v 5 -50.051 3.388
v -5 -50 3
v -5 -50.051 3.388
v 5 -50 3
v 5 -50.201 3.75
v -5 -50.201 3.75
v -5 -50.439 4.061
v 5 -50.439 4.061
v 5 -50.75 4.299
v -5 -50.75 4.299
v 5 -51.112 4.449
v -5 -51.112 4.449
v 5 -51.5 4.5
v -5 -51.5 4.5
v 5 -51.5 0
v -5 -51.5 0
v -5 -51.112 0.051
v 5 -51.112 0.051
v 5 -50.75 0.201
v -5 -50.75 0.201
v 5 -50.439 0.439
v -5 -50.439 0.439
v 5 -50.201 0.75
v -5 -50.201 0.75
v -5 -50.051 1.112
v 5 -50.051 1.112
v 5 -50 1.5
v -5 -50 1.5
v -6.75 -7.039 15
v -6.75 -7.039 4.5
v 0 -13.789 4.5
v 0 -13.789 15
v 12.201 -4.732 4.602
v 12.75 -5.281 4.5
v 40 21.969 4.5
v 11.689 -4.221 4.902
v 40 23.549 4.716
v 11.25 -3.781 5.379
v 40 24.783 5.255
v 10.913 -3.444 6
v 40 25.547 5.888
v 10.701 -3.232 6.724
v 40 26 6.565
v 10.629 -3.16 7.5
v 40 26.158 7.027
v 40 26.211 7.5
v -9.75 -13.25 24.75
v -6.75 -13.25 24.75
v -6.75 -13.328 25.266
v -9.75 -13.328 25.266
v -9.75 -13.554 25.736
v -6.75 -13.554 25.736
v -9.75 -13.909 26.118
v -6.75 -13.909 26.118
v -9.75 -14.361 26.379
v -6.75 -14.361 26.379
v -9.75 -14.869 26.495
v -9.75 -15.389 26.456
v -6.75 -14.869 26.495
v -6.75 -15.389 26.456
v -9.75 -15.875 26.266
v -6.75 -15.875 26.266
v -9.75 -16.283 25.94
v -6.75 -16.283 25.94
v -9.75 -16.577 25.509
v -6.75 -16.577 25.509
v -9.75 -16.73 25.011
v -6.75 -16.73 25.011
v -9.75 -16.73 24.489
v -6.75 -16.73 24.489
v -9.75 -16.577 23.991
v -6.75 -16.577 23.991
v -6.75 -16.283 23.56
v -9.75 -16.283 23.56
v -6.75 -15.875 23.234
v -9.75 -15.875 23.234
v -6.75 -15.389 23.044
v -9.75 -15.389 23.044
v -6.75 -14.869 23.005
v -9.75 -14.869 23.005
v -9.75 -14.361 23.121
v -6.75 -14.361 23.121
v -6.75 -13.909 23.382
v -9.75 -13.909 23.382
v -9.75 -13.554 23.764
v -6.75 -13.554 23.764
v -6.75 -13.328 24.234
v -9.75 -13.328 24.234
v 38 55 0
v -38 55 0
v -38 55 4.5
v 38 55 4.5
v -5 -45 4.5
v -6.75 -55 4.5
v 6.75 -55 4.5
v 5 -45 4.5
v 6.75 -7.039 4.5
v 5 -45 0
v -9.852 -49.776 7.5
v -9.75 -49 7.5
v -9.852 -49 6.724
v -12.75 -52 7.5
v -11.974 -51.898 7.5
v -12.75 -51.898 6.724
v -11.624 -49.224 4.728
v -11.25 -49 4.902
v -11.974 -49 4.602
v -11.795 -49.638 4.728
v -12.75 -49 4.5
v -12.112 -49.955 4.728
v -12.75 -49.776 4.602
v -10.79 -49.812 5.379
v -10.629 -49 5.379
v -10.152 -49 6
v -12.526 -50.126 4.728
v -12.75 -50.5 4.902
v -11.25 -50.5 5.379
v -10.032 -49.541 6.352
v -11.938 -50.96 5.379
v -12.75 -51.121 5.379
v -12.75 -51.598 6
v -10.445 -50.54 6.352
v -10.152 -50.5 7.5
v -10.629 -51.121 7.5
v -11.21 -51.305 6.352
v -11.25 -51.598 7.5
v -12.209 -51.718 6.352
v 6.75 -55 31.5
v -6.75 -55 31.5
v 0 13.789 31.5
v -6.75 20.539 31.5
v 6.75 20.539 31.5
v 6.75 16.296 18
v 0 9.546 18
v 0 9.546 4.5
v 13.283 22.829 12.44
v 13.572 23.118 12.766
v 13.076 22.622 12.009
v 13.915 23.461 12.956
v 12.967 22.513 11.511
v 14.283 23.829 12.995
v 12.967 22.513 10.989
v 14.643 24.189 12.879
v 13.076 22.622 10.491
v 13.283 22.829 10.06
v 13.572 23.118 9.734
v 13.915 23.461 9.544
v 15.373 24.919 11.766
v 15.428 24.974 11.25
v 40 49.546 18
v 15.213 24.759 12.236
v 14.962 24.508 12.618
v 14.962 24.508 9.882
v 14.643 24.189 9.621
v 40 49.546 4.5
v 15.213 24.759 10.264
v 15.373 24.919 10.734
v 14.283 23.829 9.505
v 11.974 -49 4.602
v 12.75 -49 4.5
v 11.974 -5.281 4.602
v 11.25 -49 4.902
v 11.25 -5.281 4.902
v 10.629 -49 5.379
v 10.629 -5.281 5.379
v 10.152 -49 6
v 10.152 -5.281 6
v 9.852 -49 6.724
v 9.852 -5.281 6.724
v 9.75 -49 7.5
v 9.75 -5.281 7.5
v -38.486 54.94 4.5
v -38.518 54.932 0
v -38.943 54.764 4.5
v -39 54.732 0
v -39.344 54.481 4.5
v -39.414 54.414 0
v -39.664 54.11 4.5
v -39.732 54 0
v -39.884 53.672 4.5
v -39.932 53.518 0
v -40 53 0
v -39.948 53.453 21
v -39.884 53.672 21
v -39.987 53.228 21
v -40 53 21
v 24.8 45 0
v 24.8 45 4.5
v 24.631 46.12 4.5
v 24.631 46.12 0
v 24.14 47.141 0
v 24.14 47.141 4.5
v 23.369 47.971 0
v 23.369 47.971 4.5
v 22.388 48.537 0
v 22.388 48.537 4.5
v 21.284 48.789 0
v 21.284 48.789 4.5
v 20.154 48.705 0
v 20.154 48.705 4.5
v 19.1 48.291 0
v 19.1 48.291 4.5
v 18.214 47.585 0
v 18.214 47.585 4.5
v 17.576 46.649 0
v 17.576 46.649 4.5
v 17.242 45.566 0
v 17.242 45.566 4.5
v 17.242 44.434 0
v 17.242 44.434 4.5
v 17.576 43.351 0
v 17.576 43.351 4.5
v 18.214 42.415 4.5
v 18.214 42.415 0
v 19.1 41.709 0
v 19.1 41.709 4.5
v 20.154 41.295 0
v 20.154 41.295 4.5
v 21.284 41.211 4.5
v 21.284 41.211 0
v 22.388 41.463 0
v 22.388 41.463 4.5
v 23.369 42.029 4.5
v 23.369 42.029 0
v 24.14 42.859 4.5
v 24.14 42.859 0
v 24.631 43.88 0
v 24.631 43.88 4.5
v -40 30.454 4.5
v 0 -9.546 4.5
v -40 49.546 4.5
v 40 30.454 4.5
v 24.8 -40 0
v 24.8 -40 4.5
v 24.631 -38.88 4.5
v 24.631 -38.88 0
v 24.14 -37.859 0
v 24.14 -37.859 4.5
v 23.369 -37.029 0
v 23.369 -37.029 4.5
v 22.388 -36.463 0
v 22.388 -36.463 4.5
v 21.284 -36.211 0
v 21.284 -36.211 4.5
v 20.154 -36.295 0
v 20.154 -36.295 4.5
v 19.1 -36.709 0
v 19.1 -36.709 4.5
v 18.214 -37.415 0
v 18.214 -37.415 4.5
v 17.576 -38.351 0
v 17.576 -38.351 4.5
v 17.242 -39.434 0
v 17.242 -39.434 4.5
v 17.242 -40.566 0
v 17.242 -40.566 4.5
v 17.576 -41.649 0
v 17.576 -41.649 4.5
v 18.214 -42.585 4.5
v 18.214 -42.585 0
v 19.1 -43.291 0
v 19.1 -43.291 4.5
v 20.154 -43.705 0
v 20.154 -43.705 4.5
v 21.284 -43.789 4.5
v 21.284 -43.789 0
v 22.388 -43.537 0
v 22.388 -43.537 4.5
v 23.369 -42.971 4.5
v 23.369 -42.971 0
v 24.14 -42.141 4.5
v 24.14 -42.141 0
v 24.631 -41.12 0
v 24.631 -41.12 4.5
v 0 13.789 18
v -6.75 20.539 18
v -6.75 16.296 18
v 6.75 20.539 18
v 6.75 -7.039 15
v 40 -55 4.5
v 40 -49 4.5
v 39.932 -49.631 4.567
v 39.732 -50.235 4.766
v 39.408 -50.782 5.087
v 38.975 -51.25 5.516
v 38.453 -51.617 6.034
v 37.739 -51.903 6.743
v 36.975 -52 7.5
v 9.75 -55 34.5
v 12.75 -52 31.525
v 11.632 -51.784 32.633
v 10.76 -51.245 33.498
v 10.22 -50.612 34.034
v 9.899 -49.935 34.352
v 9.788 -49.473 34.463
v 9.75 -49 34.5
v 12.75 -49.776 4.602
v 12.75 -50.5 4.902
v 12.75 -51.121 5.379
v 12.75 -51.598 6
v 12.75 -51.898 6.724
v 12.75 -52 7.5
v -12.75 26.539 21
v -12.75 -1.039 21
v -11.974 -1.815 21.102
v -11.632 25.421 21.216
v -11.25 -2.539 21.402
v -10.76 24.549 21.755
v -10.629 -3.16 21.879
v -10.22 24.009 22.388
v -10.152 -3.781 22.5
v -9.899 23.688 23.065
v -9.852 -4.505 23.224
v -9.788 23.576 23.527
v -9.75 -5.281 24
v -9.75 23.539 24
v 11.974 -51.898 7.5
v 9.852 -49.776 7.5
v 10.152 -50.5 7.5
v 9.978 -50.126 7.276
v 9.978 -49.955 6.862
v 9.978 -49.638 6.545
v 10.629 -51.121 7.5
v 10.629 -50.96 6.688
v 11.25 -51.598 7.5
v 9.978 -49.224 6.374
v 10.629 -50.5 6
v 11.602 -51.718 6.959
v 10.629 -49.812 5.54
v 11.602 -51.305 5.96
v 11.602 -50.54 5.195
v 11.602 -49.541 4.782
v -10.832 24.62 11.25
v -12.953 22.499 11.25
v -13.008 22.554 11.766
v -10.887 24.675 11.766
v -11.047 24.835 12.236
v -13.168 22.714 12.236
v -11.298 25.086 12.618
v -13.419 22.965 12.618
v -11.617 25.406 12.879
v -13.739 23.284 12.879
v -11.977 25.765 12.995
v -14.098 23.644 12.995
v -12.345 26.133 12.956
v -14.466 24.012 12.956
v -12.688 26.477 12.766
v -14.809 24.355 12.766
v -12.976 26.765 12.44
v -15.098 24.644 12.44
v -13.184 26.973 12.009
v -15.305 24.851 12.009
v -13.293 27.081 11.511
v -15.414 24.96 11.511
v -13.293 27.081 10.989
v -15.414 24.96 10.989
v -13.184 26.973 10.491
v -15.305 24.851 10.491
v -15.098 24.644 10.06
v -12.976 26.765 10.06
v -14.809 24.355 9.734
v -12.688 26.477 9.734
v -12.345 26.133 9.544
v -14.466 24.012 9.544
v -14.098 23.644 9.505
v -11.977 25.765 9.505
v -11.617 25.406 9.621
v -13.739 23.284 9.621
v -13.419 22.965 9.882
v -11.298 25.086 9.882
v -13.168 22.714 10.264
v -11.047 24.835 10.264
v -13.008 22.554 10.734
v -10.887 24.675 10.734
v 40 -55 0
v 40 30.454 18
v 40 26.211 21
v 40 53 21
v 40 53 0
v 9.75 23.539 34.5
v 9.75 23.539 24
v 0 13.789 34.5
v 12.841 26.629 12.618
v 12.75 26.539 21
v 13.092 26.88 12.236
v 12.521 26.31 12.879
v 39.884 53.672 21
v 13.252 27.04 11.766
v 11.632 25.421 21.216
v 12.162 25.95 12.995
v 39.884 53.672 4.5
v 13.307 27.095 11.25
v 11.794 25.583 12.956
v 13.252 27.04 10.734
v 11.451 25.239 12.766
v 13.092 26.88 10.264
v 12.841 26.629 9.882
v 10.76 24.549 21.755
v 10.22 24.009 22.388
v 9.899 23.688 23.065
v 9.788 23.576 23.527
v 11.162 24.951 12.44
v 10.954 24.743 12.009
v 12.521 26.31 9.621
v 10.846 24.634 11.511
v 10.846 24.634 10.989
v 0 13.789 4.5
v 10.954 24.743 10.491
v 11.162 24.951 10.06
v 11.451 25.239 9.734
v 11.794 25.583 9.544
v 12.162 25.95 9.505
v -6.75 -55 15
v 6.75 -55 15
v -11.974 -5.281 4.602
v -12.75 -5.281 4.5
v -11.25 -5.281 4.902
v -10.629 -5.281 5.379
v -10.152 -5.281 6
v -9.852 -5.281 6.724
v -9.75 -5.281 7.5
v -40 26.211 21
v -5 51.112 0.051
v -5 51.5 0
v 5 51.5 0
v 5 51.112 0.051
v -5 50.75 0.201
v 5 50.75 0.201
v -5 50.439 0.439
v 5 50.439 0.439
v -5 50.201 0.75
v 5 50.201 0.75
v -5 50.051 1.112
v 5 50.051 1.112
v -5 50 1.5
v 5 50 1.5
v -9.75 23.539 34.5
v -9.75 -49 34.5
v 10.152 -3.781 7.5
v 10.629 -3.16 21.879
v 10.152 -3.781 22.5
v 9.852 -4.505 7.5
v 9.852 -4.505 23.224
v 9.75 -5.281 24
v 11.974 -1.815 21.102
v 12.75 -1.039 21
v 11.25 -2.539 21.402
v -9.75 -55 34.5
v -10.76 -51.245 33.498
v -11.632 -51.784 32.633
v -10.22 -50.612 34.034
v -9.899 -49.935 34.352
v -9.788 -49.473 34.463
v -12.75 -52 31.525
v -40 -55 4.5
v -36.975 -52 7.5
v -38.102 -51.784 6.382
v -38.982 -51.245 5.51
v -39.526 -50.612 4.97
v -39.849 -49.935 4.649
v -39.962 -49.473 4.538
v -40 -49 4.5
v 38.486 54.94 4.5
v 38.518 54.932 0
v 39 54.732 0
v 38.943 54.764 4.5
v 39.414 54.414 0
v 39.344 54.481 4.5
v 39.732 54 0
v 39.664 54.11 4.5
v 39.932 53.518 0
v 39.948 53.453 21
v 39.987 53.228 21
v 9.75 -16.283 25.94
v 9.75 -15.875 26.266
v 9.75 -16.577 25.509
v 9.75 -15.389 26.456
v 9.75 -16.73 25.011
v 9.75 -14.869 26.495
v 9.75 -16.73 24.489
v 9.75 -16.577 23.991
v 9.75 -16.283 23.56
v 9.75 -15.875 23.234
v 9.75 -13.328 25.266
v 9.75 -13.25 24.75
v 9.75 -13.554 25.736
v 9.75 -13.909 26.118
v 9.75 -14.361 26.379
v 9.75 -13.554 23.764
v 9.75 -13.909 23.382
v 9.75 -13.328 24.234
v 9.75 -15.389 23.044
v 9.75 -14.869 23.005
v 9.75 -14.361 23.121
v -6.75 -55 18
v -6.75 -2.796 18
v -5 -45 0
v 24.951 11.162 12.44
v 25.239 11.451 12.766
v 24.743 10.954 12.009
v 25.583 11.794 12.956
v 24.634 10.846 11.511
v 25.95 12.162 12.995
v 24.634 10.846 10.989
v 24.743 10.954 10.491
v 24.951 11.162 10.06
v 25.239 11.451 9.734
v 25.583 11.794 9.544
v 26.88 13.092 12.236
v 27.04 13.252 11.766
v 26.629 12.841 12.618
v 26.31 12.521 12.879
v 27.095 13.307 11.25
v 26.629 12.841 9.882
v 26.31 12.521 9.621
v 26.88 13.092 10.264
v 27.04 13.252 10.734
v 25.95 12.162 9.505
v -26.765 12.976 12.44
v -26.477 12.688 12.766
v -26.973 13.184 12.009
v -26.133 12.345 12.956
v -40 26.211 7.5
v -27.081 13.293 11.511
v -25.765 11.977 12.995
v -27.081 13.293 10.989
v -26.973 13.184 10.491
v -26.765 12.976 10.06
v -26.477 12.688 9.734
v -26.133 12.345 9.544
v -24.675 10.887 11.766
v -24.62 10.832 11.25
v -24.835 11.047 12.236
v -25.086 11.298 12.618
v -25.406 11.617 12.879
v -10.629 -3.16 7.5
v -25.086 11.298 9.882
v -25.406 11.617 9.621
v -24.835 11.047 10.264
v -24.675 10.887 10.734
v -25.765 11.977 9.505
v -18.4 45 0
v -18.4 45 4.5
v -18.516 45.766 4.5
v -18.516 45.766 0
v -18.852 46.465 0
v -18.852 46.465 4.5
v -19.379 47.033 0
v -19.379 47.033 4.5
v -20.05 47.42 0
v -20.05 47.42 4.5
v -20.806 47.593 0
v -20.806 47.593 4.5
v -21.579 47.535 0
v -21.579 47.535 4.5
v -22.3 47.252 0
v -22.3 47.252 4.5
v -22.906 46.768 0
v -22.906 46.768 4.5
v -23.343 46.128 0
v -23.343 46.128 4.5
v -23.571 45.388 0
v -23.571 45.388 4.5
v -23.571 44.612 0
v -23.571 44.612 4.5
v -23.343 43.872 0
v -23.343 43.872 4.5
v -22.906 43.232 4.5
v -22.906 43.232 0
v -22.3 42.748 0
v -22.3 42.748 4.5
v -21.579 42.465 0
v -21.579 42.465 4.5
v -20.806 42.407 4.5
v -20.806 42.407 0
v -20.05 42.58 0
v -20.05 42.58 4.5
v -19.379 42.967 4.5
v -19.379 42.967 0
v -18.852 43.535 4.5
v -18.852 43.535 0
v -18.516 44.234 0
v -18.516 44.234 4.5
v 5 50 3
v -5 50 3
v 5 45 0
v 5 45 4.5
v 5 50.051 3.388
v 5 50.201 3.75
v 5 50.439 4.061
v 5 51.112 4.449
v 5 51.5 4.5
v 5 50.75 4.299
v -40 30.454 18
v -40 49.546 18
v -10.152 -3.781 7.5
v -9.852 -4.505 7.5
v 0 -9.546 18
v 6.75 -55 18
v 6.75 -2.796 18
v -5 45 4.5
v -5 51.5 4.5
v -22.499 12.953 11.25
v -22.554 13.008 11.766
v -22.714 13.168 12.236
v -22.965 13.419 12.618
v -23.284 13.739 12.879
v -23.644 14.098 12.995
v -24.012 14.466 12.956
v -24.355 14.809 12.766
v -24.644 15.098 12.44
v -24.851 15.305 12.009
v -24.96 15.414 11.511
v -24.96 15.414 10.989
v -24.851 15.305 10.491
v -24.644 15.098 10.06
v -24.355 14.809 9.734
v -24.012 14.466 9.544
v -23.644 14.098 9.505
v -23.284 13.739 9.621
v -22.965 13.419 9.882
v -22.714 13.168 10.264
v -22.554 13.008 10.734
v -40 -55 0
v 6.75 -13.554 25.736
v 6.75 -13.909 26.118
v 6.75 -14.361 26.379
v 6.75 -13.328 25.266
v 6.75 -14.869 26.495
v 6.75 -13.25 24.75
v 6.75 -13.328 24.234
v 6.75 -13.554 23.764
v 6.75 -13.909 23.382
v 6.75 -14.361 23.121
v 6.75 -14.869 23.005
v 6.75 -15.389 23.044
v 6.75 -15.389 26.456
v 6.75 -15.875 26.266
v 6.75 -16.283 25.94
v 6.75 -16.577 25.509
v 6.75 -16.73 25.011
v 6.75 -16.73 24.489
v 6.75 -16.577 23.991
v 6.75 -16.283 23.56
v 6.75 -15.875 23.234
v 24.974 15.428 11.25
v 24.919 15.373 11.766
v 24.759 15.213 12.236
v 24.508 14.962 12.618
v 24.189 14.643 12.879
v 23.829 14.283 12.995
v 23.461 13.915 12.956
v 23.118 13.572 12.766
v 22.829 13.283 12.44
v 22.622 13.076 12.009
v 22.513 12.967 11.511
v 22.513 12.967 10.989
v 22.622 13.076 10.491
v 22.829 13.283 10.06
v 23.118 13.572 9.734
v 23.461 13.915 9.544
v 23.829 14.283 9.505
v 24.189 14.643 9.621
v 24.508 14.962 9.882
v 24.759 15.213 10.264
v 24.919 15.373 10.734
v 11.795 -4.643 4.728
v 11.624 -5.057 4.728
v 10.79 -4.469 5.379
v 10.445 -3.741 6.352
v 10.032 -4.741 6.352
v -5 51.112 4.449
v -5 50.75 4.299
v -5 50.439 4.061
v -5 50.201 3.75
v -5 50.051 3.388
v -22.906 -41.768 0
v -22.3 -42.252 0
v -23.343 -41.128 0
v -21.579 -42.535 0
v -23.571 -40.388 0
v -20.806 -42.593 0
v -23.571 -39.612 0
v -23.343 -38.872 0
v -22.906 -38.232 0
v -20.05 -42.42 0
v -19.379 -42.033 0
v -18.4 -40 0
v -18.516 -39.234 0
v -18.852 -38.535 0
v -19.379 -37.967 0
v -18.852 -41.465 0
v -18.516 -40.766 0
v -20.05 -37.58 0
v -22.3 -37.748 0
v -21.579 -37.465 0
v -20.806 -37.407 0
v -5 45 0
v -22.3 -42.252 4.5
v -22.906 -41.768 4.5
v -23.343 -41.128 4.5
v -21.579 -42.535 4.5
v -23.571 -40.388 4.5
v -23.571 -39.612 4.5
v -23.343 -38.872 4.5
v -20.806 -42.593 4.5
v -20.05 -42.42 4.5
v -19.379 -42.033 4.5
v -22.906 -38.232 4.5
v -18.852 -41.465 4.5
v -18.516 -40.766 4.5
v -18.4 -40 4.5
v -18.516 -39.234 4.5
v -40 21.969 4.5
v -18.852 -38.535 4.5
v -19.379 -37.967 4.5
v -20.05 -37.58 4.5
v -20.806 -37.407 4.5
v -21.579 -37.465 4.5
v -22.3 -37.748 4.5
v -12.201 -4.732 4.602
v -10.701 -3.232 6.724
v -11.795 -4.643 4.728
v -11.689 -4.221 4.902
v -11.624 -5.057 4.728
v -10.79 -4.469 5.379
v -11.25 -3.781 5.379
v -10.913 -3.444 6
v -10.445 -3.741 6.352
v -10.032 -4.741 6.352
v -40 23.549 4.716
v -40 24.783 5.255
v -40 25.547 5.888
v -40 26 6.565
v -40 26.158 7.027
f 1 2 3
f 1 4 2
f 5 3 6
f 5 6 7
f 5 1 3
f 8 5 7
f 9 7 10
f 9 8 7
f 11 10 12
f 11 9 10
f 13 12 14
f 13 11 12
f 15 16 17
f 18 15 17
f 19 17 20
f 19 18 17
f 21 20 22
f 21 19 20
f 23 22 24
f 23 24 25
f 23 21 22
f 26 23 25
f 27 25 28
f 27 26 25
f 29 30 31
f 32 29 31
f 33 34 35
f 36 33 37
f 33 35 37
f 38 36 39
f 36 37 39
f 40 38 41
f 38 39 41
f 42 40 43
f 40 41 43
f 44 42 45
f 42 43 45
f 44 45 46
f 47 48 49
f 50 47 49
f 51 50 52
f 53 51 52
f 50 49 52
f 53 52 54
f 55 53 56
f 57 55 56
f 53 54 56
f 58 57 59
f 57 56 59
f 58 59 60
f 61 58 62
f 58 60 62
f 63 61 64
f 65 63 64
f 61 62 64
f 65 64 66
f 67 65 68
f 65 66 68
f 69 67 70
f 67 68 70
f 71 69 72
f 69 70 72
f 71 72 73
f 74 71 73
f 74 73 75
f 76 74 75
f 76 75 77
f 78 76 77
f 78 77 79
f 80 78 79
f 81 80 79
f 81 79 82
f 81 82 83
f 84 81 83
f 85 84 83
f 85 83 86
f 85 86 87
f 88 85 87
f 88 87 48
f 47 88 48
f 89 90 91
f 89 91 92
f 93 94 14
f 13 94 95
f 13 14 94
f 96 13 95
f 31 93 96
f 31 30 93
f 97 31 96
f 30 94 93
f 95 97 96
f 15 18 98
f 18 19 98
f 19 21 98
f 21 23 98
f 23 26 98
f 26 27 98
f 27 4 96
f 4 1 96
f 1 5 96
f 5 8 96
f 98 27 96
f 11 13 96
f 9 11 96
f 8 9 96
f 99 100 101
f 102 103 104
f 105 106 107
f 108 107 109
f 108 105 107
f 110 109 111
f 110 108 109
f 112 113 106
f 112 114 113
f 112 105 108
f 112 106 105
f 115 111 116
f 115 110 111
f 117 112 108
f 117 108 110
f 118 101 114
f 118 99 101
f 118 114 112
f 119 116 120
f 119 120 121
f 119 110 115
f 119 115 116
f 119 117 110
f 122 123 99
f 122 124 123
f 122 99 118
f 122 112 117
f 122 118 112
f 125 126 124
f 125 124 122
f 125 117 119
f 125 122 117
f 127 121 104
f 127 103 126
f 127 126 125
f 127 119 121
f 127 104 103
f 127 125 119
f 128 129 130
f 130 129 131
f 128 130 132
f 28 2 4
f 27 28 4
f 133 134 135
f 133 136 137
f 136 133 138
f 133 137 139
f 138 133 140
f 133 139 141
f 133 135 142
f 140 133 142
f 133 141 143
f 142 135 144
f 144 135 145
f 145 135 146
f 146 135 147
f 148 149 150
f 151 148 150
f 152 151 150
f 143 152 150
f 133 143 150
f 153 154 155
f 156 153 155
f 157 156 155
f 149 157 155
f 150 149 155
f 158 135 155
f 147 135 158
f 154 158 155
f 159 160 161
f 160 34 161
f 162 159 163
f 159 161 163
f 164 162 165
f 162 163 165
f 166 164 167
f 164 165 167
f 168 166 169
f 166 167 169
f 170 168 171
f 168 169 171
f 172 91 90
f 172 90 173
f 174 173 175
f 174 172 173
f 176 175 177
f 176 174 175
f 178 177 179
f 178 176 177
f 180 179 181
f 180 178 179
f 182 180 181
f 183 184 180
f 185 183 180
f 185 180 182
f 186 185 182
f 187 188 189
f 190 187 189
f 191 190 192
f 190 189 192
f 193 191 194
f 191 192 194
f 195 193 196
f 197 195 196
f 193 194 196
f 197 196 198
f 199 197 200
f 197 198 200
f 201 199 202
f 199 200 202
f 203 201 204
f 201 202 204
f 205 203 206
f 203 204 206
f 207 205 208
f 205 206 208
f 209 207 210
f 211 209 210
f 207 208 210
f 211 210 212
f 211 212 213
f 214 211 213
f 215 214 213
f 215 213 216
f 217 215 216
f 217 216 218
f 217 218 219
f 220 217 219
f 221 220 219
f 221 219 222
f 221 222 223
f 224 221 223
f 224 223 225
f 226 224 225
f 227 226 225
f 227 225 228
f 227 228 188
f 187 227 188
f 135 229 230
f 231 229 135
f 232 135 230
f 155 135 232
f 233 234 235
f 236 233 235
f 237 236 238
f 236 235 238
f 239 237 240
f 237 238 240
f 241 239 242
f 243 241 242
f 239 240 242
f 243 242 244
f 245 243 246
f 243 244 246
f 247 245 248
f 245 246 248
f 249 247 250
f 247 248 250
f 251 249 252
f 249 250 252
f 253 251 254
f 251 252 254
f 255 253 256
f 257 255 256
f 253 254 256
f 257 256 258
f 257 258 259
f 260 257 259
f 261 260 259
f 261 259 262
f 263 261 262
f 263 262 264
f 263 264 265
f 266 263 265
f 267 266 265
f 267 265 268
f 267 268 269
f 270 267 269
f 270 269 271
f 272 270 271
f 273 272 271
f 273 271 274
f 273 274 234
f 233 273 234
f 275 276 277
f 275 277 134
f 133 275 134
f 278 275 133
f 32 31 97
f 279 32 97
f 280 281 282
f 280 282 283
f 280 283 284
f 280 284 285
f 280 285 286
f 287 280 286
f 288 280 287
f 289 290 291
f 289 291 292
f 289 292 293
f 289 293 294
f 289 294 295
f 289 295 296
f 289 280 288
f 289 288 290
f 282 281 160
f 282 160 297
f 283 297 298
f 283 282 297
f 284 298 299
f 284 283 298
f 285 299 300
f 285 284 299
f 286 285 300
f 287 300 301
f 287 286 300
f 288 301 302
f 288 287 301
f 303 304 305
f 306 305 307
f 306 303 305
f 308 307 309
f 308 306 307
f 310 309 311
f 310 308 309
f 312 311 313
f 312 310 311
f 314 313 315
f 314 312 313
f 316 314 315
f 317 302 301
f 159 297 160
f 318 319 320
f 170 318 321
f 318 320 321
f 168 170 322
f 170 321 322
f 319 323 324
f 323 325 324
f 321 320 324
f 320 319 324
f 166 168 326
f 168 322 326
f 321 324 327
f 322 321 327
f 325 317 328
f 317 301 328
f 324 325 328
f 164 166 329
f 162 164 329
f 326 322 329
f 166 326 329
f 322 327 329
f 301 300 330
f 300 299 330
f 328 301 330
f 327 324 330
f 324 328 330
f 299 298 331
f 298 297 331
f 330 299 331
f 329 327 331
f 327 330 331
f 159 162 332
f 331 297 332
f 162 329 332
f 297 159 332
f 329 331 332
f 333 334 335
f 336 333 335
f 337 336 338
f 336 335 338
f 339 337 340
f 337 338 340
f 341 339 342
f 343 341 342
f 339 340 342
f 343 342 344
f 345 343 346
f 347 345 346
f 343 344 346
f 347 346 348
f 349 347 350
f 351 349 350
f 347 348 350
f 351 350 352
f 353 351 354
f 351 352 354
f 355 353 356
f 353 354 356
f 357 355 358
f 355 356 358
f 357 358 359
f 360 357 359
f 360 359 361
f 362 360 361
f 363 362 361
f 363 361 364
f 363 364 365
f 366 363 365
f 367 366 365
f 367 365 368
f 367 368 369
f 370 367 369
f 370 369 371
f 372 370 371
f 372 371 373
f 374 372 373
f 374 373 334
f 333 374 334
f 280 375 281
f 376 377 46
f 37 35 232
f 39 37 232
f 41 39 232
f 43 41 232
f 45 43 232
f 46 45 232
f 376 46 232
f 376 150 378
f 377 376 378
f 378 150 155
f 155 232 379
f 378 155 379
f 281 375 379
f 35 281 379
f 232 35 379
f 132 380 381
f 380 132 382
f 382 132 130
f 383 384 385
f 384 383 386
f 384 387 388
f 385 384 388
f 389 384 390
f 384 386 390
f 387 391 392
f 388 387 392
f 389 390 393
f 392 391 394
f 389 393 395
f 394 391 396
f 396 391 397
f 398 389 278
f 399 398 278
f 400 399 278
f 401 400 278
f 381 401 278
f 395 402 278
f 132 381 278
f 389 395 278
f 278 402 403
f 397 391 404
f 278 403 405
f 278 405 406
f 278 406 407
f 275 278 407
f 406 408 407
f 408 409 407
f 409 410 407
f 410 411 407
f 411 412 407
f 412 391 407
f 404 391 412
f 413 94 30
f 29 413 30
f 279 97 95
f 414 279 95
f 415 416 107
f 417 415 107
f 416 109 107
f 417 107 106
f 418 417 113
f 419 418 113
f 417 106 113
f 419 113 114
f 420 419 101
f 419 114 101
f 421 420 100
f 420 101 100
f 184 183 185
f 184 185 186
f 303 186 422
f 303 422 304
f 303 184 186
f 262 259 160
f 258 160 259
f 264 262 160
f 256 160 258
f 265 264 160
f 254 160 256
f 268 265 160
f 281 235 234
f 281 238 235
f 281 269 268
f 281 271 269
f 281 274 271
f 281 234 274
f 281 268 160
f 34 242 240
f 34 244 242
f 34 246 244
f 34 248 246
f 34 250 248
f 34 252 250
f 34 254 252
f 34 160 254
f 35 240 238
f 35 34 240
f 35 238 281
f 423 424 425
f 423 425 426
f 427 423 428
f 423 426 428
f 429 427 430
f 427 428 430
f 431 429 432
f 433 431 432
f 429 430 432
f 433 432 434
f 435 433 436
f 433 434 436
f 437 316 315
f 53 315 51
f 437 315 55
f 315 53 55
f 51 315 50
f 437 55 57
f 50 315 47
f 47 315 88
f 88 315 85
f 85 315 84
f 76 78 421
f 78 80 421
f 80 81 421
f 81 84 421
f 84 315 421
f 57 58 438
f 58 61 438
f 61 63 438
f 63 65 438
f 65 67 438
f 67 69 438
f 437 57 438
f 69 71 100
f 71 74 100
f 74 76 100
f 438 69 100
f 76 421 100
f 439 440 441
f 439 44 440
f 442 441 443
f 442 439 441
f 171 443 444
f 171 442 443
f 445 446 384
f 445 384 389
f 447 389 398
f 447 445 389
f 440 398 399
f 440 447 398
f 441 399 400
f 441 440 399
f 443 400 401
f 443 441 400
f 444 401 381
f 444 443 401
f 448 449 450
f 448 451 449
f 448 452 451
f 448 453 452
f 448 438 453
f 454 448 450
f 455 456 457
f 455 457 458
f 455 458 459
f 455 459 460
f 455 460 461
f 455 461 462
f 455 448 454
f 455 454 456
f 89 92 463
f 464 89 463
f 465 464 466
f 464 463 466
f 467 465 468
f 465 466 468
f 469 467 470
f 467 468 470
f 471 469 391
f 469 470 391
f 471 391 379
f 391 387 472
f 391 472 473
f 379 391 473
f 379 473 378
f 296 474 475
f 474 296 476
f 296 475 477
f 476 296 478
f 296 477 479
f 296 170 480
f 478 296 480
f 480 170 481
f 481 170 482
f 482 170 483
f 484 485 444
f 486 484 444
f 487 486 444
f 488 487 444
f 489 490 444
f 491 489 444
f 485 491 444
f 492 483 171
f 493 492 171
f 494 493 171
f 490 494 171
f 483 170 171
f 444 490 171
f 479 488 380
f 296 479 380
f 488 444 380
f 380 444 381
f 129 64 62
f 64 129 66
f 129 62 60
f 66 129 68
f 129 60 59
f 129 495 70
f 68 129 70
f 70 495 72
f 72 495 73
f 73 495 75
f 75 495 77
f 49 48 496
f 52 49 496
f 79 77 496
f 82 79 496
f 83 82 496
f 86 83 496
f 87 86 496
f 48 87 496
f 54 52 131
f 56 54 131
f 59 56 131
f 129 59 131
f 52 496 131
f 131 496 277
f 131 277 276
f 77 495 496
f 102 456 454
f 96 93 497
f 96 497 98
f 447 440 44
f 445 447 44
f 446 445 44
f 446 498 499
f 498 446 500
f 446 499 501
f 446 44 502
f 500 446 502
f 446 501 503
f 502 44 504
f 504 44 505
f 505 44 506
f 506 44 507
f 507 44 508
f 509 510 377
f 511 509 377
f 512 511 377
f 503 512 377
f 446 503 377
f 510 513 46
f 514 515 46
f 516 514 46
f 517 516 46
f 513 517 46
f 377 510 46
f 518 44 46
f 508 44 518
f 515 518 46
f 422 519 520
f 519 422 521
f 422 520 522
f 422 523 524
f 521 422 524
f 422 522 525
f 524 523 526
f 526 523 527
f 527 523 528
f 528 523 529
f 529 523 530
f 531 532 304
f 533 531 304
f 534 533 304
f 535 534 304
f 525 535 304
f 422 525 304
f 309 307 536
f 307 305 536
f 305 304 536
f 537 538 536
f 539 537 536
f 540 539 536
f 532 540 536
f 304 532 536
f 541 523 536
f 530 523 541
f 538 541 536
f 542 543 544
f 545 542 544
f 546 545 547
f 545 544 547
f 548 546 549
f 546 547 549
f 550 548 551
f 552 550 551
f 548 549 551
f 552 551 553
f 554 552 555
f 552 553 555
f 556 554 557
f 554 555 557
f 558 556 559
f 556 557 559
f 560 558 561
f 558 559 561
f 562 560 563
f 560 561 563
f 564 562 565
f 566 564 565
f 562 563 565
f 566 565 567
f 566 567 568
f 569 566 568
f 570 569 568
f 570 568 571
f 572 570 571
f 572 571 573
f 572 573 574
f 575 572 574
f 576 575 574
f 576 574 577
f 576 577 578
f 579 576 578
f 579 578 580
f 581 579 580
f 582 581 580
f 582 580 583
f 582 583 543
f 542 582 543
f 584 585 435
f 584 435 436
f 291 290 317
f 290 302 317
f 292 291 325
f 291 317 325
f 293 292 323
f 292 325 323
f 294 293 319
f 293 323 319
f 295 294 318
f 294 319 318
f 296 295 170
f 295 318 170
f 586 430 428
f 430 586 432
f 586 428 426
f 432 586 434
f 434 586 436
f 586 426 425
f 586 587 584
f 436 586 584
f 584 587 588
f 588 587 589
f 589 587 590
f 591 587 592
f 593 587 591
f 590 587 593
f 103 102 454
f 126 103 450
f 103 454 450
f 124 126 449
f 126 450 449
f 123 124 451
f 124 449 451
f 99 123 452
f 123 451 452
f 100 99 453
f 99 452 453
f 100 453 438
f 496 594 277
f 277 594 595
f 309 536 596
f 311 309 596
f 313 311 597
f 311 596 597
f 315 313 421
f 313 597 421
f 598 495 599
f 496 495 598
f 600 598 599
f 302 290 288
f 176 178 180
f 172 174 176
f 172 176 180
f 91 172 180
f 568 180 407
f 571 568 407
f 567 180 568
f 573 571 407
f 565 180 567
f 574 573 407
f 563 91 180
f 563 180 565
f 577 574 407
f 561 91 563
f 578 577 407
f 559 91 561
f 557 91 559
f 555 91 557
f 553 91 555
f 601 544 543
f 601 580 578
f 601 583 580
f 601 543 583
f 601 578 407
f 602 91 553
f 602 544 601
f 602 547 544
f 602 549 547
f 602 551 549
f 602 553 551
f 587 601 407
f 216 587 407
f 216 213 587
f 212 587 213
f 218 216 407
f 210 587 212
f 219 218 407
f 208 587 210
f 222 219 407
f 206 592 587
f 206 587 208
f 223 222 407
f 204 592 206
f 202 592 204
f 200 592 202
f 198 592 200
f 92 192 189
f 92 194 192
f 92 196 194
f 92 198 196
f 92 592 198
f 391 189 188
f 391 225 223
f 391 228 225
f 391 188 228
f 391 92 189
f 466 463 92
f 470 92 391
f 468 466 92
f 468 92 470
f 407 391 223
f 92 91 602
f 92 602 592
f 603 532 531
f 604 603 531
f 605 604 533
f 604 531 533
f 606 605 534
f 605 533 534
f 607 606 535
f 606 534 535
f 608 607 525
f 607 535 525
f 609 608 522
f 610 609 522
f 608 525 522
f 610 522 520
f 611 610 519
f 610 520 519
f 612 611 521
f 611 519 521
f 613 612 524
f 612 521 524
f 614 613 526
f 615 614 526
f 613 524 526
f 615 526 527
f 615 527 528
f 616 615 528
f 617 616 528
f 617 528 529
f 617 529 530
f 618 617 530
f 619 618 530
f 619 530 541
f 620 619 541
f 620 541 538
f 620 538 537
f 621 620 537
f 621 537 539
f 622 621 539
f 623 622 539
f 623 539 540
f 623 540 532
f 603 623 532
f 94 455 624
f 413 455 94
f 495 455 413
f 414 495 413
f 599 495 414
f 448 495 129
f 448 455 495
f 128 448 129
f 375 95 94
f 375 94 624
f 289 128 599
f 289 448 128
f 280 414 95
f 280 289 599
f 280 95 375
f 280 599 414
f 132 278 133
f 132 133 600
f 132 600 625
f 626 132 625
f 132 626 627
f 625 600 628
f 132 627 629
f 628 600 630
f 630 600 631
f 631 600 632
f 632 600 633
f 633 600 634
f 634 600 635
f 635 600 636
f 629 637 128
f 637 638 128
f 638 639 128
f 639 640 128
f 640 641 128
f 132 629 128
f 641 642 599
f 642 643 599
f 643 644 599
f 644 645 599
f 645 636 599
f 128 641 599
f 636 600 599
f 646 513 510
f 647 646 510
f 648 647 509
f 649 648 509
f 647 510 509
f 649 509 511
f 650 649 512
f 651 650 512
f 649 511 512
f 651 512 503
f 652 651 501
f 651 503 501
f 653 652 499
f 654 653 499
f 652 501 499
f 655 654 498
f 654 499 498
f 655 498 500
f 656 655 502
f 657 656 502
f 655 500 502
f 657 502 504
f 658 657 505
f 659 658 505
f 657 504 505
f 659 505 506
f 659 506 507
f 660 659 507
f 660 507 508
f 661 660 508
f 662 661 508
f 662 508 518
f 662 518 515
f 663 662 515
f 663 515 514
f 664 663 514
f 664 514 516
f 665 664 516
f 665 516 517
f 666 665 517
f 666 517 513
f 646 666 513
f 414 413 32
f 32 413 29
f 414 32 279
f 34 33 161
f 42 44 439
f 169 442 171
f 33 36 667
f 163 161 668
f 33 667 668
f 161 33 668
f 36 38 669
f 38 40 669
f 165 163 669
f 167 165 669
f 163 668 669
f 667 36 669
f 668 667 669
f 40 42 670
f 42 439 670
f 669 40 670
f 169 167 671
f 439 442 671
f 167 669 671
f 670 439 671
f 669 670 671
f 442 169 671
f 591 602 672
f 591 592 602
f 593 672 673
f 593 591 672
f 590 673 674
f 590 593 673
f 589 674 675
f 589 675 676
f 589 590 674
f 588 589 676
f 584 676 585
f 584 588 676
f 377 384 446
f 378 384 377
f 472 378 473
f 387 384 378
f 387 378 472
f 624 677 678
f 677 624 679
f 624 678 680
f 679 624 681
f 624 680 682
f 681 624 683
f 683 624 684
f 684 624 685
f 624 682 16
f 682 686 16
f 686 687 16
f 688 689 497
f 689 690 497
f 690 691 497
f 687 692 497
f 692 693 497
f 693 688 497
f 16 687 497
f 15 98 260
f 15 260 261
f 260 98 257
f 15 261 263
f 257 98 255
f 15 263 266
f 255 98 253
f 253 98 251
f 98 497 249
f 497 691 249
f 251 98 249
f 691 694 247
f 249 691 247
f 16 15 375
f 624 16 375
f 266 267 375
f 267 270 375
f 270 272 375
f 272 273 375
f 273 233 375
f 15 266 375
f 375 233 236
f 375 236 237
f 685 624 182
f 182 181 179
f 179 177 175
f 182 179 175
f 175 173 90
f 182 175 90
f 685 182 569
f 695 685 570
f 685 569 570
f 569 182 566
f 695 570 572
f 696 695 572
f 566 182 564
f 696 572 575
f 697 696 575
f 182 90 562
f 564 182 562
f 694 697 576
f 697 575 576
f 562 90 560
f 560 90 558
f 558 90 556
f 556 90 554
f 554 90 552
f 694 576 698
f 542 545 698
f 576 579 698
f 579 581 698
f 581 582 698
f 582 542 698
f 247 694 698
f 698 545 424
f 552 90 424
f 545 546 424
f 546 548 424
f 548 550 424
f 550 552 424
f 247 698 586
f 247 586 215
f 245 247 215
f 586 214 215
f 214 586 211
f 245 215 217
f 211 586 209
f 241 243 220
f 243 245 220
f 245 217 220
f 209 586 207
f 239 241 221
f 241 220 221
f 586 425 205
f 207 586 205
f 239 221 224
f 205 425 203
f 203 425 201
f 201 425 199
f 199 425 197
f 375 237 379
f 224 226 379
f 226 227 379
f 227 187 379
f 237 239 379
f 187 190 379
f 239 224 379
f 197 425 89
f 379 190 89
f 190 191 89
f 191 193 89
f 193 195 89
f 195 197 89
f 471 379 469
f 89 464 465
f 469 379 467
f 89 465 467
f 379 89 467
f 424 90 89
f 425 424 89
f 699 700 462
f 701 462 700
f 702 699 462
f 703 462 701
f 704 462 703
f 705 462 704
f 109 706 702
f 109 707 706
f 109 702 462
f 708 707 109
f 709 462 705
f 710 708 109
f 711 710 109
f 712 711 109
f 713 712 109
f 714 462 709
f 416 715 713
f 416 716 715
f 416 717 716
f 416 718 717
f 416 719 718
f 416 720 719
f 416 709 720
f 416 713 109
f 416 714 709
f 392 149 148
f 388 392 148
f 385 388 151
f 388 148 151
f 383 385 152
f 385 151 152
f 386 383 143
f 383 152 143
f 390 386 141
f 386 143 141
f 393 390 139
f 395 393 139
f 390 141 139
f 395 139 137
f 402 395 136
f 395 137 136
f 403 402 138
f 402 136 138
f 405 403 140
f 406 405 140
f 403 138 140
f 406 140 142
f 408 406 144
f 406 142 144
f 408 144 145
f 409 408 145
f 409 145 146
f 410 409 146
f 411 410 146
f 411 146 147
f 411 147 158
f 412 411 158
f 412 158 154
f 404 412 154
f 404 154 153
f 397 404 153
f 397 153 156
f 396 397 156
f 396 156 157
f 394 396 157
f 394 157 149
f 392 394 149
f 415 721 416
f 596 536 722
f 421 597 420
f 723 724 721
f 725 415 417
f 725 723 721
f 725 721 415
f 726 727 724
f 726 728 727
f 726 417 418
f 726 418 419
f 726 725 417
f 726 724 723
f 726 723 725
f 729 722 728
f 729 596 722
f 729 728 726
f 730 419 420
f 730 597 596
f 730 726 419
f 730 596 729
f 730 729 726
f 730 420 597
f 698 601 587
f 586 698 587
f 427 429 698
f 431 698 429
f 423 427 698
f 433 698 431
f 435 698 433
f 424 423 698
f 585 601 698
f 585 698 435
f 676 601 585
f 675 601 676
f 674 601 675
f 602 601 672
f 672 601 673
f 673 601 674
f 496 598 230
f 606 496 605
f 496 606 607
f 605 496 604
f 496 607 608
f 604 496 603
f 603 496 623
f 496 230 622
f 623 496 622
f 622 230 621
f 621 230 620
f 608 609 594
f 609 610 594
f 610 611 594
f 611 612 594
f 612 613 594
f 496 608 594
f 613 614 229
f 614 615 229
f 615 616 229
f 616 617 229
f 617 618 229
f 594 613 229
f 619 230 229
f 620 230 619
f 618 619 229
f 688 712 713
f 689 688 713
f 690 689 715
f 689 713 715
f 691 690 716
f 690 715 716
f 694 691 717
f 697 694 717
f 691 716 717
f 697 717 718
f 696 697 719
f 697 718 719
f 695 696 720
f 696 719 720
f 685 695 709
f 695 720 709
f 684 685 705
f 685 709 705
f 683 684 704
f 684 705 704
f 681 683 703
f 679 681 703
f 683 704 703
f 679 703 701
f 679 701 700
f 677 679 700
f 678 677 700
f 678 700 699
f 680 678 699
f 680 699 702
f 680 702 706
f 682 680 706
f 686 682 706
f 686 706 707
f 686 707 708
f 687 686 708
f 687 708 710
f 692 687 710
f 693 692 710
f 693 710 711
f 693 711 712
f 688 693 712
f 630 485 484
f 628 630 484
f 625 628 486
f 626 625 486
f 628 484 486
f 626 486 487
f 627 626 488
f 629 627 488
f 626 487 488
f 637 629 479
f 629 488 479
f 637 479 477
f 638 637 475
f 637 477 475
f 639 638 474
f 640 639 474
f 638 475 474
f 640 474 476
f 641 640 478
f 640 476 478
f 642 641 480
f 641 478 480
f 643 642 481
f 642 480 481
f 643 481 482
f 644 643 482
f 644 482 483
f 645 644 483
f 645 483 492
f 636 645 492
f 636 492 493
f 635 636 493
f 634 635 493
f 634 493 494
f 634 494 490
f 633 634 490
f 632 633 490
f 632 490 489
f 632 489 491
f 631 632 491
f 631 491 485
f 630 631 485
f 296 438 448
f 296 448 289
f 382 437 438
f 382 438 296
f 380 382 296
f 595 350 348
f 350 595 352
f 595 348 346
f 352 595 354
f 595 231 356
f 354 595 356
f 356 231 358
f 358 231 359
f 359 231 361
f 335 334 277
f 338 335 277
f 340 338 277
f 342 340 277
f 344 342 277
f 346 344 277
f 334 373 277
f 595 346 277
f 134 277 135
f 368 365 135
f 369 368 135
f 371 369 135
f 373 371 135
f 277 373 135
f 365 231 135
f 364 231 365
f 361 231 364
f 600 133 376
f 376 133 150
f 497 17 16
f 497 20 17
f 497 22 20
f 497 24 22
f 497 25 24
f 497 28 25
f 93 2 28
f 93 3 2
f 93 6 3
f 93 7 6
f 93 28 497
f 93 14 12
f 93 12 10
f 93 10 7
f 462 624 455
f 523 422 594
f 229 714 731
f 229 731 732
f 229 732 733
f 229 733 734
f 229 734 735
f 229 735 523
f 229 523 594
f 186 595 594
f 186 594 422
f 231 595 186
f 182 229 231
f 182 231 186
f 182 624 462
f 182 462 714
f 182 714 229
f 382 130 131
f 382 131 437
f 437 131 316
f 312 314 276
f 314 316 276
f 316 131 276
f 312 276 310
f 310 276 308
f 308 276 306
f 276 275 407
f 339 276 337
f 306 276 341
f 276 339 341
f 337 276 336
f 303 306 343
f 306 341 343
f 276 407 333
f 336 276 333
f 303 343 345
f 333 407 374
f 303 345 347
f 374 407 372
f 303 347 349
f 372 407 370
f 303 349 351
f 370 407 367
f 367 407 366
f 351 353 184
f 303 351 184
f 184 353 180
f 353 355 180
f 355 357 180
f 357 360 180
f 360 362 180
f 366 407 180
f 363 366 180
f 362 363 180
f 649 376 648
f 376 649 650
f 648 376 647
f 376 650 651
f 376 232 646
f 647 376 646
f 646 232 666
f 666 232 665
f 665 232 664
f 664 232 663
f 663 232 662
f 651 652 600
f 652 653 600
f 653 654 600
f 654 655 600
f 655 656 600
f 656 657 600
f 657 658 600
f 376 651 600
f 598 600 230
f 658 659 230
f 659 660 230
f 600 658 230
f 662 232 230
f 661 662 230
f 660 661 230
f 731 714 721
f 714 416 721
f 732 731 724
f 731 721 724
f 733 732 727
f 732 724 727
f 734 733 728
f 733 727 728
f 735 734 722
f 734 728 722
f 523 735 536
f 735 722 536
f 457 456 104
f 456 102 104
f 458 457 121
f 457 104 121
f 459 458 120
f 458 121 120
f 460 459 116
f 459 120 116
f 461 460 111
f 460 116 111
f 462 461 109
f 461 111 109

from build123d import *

# Parameters (mm, degrees)
F0_W      = 80
F0_H      = 110
F1_DEPTH  = 4.5
F2_W      = 10
F2_H      = 5
F3_DEPTH  = 4.501
F5_DEPTH  = 13.5
F6_R      = 3.8
F6_R_2    = 2.6
F7_DEPTH  = 4.501
F10_DEPTH = 13.5
F12_DEPTH = 3
F14_DEPTH = 3
F16_DEPTH = 3
F17_R     = 1.75
F18_DEPTH = 49.751
F19_R     = 1.75
F20_DEPTH = 76.9261442127
F21_R     = 1.75
F22_DEPTH = 76.9261442127
F24_DEPTH = 3
F25_R     = 1.5
F26_R     = 3
F27_R     = 2


with BuildPart() as f1:
    # F0 (on Top) → F1 (new body)
    with BuildSketch(Plane.XY):
        Rectangle(F0_W, F0_H)
    extrude(amount=F1_DEPTH)

    # F2 (on face) → F3 (cut, through all)
    with BuildSketch(Plane.XY.offset(4.5)):
        with Locations((0, 47.5)):
            Rectangle(F2_W, F2_H)
        with Locations((0, -47.5)):
            Rectangle(F2_W, F2_H)
    extrude(amount=-F3_DEPTH, mode=Mode.SUBTRACT)

    # F4 (on face) → F5 (join)
    with BuildSketch(Plane.XY.offset(4.5)):
        Polygon((40, 30.454058454), (0, -9.545941546), (-40, 30.454058454), (-40, 26.2114177669), (-9.75, -4.0385822331), (-9.75, -55), (-6.75, -55), (-6.75, -7.0385822331), (0, -13.7885822331), (6.75, -7.0385822331), (6.75, -55), (9.75, -55), (9.75, -4.0385822331), (40, 26.2114177669), align=None)
        Polygon((-40, 49.545941546), (0, 9.545941546), (40, 49.545941546), (40, 53.7885822331), (0, 13.7885822331), (-40, 53.7885822331), align=None)
    extrude(amount=F5_DEPTH)

    # F6 (on face) → F7 (cut, through all)
    with BuildSketch(Plane.XY.offset(4.5)):
        with Locations((21, -40)):
            Circle(F6_R)
        with Locations((21, 45)):
            Circle(F6_R)
        with Locations((-21, 45)):
            Circle(F6_R_2)
        with Locations((-21, -40)):
            Circle(F6_R_2)
    extrude(amount=-F7_DEPTH, mode=Mode.SUBTRACT)

    # F9 (on face) → F10 (join)
    with BuildSketch(Plane.XY.offset(18)):
        Polygon((-9.75, 23.5385822331), (-9.75, -55), (-6.75, -55), (-6.75, 20.5385822331), align=None)
        Polygon((9.75, 23.5385822331), (6.75, 20.5385822331), (6.75, -55), (9.75, -55), align=None)
    extrude(amount=F10_DEPTH)

    # F11 (on face) → F12 (join)
    with BuildSketch(Plane.XY.offset(18)):
        Polygon((9.75, 23.5385822331), (9.75, -4.0385822331), (40, 26.2114177669), (40, 53.7885822331), align=None)
        Polygon((-40, 53.7885822331), (-40, 26.2114177669), (-9.75, -4.0385822331), (-9.75, 23.5385822331), align=None)
    extrude(amount=F12_DEPTH)

    # F13 (on offset) → F14 (join)
    with BuildSketch(Plane.XY.offset(18)):
        Polygon((0, -13.7885822331), (-6.75, -7.0385822331), (-6.75, -55), (6.75, -55), (6.75, -7.0385822331), align=None)
    extrude(amount=-F14_DEPTH)

    # F15 (on face) → F16 (join)
    with BuildSketch(Plane.XY.offset(31.5)):
        Polygon((-9.75, 23.5385822331), (-9.75, -55), (9.75, -55), (9.75, 23.5385822331), (0, 13.7885822331), align=None)
    extrude(amount=F16_DEPTH)

    # F17 (on face) → F18 (cut, through all)
    with BuildSketch(Plane.YZ.offset(9.75)):
        with Locations((-15, 24.75)):
            Circle(F17_R)
    extrude(amount=-F18_DEPTH, mode=Mode.SUBTRACT)

    # F19 (on face) → F20 (cut, through all)
    with BuildSketch(Plane(origin=(6.8942911166, -6.8942911166, 0), x_dir=(0.7071067812, 0.7071067812, 0), z_dir=(0.7071067812, -0.7071067812, 0))):
        with Locations((26.8185424949, 11.25)):
            Circle(F19_R)
    extrude(amount=-F20_DEPTH, mode=Mode.SUBTRACT)

    # F21 (on face) → F22 (cut, through all)
    with BuildSketch(Plane(origin=(-6.8942911166, -6.8942911166, 0), x_dir=(0.7071067812, -0.7071067812, 0), z_dir=(-0.7071067812, -0.7071067812, 0))):
        with Locations((-26.8185424949, 11.25)):
            Circle(F21_R)
    extrude(amount=-F22_DEPTH, mode=Mode.SUBTRACT)

    # F23 (on face) → F24 (join)
    with BuildSketch(Plane.XZ.offset(55)):
        Polygon((40, 4.5), (9.75, 34.5), (9.75, 4.5), align=None)
        Polygon((-40, 4.5), (-9.75, 4.5), (-9.75, 34.5), align=None)
    extrude(amount=-F24_DEPTH)

    # F25
    f25_edges = [f1.edges().sort_by_distance(p)[0] for p in [
        (0, 50, 4.5),
        (0, 50, 0),
        (0, -50, 0),
        (0, -50, 4.5),
    ]]
    fillet(f25_edges, radius=F25_R)

    # F26
    f26_edges = [f1.edges().sort_by_distance(p)[0] for p in [
        (-9.75, -52, 19.5),
        (-9.75, 9.75, 21),
        (-9.75, -28.019291, 4.5),
        (-24.875, -52, 4.5),
        (-9.75, -4.038582, 12.75),
        (-24.875, 11.086418, 4.5),
        (24.875, -52, 4.5),
        (9.75, -52, 19.5),
        (9.75, -28.019291, 4.5),
        (9.75, -4.038582, 12.75),
        (9.75, 9.75, 21),
        (24.875, 11.086418, 4.5),
    ]]
    fillet(f26_edges, radius=F26_R)

    # F27
    f27_edges = [f1.edges().sort_by_distance(p)[0] for p in [
        (-40, 55, 2.25),
        (40, 55, 2.25),
    ]]
    fillet(f27_edges, radius=F27_R)


solid = f1.part
